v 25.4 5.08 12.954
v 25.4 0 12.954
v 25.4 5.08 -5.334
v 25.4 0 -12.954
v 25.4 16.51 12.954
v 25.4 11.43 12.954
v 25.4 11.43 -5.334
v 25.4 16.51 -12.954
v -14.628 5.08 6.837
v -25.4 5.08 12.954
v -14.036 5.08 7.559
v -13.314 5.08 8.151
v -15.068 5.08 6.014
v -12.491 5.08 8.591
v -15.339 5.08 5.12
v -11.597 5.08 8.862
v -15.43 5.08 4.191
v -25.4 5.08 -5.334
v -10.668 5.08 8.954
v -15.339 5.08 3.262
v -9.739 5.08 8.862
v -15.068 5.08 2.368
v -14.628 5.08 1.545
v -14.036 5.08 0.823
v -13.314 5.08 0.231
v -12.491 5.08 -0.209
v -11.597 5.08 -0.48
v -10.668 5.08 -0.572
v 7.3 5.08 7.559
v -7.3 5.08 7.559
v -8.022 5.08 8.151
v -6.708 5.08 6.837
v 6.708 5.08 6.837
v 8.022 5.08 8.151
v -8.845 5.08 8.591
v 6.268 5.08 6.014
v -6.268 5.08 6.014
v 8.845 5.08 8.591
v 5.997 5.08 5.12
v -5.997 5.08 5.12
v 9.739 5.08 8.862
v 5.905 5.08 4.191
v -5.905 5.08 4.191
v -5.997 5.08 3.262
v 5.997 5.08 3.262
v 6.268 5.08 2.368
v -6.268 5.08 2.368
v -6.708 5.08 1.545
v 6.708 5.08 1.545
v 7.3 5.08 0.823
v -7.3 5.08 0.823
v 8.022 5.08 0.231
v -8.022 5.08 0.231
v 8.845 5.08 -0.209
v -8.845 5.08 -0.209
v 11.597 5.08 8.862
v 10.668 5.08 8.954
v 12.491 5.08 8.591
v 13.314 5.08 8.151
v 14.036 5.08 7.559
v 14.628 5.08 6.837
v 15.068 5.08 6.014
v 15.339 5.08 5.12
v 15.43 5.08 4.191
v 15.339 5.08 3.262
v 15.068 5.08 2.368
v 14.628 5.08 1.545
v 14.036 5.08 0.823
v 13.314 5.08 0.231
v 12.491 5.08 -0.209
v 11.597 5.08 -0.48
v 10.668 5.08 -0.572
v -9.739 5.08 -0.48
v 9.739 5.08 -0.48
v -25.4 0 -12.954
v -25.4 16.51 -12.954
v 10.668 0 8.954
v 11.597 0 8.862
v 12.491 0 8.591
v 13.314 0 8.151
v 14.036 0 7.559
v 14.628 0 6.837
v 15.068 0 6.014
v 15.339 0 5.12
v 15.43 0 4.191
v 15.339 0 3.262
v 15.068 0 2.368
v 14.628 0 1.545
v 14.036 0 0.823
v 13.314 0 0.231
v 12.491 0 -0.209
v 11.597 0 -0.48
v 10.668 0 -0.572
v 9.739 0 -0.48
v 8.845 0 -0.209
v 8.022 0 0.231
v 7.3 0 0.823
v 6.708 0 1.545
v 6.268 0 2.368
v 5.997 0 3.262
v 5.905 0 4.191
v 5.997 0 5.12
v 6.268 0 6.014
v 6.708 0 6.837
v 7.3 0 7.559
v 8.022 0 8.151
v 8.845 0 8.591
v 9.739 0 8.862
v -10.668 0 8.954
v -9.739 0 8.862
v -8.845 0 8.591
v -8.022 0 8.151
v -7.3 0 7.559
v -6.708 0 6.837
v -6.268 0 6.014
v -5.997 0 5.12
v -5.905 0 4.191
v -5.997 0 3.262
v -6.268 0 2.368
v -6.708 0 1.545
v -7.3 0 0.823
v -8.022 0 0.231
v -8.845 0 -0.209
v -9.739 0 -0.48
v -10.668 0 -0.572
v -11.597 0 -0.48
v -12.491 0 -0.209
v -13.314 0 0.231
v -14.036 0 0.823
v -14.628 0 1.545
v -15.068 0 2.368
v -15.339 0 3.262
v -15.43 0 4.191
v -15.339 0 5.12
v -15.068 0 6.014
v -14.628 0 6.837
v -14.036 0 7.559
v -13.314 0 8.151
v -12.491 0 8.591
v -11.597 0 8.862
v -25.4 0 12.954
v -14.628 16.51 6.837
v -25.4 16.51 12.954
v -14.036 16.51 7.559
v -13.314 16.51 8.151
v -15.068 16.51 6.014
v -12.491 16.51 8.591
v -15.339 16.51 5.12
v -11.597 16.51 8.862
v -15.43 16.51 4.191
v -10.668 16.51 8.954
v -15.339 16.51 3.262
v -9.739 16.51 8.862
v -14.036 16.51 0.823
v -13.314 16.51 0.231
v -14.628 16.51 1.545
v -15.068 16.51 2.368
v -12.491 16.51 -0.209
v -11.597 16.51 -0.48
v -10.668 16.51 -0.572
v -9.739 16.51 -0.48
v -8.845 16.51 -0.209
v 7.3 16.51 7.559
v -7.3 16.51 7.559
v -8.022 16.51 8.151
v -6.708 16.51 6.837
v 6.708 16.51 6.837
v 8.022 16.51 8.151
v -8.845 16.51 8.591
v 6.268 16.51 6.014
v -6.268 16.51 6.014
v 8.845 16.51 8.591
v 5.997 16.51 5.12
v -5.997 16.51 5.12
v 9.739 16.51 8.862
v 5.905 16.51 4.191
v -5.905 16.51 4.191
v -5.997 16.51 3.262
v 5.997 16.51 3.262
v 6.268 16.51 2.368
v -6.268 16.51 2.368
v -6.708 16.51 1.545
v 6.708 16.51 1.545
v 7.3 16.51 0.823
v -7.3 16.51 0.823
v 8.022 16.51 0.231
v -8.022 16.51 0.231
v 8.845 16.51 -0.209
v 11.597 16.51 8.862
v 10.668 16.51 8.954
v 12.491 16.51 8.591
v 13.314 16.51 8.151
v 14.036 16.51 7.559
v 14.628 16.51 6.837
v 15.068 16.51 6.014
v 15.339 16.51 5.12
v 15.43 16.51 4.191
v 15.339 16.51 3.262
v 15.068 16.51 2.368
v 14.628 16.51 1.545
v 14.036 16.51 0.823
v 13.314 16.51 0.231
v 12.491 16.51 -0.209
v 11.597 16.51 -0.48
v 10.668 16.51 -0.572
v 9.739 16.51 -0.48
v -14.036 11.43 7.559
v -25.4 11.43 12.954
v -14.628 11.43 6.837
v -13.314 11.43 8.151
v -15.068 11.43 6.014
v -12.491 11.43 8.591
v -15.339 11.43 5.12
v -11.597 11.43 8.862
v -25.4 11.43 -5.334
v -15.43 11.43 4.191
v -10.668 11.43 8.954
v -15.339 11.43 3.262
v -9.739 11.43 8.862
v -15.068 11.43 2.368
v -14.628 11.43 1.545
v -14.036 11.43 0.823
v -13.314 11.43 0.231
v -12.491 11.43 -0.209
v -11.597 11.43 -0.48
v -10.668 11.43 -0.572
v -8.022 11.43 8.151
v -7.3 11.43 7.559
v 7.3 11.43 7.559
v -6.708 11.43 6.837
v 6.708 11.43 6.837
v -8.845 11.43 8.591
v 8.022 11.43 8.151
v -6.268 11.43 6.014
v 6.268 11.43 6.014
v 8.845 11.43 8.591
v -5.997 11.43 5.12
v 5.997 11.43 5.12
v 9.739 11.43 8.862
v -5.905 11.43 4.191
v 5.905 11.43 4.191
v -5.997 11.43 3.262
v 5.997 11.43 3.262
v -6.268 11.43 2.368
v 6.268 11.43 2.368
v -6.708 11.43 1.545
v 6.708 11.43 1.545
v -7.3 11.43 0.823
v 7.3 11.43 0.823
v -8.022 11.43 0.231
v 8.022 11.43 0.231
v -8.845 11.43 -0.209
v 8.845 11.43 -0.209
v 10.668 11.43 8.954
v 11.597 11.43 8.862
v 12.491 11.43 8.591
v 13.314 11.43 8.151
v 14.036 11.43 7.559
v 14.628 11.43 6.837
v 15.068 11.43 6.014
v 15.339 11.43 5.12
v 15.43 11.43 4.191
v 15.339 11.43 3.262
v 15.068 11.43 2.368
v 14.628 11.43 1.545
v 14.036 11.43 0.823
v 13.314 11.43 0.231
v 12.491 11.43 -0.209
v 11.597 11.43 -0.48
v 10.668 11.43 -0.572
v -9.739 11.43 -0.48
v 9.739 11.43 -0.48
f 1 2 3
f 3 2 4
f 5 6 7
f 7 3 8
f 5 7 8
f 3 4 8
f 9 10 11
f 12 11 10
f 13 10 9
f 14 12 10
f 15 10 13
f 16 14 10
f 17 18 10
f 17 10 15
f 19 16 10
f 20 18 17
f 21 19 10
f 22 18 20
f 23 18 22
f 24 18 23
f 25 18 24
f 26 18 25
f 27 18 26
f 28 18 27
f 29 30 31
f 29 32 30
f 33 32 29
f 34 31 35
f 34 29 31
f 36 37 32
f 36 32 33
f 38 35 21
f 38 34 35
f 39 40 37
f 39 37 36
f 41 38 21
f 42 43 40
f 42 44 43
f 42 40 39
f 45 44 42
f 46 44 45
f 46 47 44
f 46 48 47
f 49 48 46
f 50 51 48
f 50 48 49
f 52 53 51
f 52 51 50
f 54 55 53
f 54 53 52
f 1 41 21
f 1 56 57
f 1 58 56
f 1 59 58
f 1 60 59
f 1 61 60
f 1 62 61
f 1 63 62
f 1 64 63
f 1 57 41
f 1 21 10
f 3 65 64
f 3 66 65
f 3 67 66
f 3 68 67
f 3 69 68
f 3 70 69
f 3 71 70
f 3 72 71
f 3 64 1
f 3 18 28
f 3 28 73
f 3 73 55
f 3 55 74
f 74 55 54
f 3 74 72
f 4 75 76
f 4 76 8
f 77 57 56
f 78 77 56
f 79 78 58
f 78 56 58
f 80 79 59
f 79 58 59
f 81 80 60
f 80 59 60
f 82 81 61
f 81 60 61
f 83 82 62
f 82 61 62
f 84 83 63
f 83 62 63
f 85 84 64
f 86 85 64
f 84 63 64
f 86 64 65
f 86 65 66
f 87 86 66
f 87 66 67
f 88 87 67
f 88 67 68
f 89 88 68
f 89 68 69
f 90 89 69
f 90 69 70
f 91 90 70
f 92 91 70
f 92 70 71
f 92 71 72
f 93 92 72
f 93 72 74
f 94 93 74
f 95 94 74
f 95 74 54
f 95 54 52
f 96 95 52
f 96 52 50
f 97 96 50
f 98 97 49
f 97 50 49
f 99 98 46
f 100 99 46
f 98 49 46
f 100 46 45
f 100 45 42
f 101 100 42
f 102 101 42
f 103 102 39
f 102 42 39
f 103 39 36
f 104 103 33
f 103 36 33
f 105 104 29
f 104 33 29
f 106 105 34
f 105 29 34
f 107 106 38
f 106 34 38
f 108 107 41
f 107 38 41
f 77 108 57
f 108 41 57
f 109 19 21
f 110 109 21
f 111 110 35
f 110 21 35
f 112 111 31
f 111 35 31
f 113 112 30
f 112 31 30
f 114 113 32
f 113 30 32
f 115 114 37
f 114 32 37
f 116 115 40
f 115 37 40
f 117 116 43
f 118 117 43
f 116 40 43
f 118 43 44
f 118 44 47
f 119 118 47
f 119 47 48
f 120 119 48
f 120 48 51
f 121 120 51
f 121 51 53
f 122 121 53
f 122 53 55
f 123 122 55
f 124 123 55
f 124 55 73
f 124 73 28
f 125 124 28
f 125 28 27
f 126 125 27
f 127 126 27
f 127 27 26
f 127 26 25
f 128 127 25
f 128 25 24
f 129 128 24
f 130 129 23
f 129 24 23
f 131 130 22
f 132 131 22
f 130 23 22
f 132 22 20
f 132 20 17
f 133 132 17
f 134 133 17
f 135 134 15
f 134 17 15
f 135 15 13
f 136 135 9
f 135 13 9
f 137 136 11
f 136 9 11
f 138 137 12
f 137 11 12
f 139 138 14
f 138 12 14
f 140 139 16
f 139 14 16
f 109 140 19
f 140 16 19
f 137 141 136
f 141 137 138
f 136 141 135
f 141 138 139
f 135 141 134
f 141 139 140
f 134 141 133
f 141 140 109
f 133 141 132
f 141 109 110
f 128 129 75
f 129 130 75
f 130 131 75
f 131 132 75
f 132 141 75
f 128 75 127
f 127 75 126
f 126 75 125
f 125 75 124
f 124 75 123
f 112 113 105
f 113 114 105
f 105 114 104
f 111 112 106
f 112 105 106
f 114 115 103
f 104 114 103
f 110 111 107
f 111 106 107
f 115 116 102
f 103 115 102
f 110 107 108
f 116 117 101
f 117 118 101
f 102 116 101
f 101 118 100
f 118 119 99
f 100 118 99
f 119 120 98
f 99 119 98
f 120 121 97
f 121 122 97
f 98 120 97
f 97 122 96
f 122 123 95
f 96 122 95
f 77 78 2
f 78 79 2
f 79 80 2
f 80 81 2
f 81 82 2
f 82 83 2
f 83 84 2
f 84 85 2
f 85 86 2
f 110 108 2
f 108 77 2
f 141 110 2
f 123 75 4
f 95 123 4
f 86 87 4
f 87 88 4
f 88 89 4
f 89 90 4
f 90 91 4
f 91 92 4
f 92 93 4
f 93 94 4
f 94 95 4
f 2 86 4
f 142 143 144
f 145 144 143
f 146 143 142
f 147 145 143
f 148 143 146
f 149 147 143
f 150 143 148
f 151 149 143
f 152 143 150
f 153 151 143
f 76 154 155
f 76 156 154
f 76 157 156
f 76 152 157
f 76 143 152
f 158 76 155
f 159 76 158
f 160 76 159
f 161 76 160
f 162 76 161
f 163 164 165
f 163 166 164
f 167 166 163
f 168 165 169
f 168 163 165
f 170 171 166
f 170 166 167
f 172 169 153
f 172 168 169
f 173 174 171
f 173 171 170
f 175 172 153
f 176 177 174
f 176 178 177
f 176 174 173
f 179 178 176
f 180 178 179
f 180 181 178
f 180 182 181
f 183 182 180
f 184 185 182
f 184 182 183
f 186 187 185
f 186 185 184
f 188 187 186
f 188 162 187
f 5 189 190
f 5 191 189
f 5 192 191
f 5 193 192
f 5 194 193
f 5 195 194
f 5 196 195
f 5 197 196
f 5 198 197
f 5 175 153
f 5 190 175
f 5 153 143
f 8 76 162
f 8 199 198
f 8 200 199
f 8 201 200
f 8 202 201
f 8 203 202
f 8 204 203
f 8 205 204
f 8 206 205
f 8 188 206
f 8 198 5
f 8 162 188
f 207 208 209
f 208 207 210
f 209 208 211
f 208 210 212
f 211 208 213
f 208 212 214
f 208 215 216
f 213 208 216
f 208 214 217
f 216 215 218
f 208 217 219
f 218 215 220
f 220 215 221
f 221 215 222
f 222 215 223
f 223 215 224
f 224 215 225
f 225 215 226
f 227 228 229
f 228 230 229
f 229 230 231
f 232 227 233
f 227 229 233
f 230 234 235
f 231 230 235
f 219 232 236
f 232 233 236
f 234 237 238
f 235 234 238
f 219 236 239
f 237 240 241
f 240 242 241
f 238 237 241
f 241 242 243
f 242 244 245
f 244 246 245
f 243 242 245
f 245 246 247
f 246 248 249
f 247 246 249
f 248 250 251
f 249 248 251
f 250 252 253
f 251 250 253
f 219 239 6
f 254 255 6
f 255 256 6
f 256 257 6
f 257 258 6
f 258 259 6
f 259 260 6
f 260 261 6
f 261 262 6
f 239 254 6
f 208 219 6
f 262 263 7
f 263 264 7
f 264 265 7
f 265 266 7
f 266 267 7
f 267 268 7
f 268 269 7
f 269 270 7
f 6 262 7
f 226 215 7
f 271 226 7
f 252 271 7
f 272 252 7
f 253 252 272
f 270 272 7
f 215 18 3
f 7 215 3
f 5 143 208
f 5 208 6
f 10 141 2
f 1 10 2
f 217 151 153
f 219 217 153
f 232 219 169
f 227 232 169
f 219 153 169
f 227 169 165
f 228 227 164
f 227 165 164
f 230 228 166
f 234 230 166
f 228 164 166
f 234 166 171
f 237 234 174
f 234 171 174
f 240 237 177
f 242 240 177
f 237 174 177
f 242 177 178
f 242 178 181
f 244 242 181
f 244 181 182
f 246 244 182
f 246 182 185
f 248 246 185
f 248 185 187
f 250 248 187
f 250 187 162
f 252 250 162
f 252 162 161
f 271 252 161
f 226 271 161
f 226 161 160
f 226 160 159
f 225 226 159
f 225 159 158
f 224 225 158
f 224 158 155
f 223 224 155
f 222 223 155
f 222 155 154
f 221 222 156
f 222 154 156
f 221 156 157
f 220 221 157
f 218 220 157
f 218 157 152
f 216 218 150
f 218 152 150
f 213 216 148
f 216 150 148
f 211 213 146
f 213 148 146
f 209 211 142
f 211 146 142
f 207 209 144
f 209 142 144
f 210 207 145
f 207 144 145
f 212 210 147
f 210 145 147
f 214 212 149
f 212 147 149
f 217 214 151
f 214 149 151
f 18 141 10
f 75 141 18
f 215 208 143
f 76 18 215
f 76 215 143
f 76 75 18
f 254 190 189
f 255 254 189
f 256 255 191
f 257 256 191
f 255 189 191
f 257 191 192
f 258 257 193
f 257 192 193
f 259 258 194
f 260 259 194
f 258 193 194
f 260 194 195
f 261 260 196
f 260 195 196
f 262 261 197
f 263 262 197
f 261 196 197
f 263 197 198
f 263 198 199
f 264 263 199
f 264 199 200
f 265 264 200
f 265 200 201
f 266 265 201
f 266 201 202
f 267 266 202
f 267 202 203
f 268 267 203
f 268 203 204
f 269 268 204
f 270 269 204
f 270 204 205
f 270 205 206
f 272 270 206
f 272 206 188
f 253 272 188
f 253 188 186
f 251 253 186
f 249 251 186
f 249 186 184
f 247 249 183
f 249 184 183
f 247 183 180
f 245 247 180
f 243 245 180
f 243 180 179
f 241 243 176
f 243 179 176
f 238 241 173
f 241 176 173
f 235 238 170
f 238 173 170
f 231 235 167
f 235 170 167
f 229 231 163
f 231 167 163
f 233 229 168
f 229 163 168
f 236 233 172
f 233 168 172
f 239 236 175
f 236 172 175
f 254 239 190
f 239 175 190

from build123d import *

# Parameters (mm, degrees)
SKETCH1_W           = 50.8
SKETCH1_H           = 25.908
BOSS_EXTRUDE1_DEPTH = 5.08
SKETCH2_W           = 50.8
SKETCH2_H           = 7.62
BOSS_EXTRUDE2_DEPTH = 6.35
SKETCH3_W           = 50.8
SKETCH3_H           = 7.62
BOSS_EXTRUDE3_DEPTH = 5.08
SKETCH4_W           = 50.8
SKETCH4_H           = 5.08
BOSS_EXTRUDE4_DEPTH = 18.288
SKETCH5_R           = 4.7625
CUT_EXTRUDE1_DEPTH  = 33.947628382


with BuildPart() as part:
    # Sketch1 → Boss-Extrude1 (new body)
    with BuildSketch(Plane(origin=(0, 0, 0), x_dir=(1, 0, 0), z_dir=(0, 1, 0))):
        Rectangle(SKETCH1_W, SKETCH1_H)
    extrude(amount=BOSS_EXTRUDE1_DEPTH)

    # Sketch2 → Boss-Extrude2 (add)
    with BuildSketch(Plane(origin=(0, 5.08, 0), x_dir=(1, 0, 0), z_dir=(0, 1, 0))):
        with Locations((0, 9.144)):
            Rectangle(SKETCH2_W, SKETCH2_H)
    extrude(amount=BOSS_EXTRUDE2_DEPTH)

    # Sketch3 → Boss-Extrude3 (add)
    with BuildSketch(Plane(origin=(0, 11.43, 0), x_dir=(1, 0, 0), z_dir=(0, 1, 0))):
        with Locations((0, 9.144)):
            Rectangle(SKETCH3_W, SKETCH3_H)
    extrude(amount=BOSS_EXTRUDE3_DEPTH)

    # Sketch4 → Boss-Extrude4 (add)
    with BuildSketch(Plane.XY.offset(-5.334)):
        with Locations((0, 13.97)):
            Rectangle(SKETCH4_W, SKETCH4_H)
    extrude(amount=BOSS_EXTRUDE4_DEPTH)

    # Sketch5 → Cut-Extrude1 (cut, through all)
    with BuildSketch(Plane(origin=(0, 16.51, 0), x_dir=(1, 0, 0), z_dir=(0, 1, 0))):
        with Locations(Location((-10.668, -4.191, 0), (0, 0, 270))):
            Circle(SKETCH5_R)
        with Locations(Location((10.668, -4.191, 0), (0, 0, 270))):
            Circle(SKETCH5_R)
    extrude(amount=-CUT_EXTRUDE1_DEPTH, mode=Mode.SUBTRACT)


solid = part.part
